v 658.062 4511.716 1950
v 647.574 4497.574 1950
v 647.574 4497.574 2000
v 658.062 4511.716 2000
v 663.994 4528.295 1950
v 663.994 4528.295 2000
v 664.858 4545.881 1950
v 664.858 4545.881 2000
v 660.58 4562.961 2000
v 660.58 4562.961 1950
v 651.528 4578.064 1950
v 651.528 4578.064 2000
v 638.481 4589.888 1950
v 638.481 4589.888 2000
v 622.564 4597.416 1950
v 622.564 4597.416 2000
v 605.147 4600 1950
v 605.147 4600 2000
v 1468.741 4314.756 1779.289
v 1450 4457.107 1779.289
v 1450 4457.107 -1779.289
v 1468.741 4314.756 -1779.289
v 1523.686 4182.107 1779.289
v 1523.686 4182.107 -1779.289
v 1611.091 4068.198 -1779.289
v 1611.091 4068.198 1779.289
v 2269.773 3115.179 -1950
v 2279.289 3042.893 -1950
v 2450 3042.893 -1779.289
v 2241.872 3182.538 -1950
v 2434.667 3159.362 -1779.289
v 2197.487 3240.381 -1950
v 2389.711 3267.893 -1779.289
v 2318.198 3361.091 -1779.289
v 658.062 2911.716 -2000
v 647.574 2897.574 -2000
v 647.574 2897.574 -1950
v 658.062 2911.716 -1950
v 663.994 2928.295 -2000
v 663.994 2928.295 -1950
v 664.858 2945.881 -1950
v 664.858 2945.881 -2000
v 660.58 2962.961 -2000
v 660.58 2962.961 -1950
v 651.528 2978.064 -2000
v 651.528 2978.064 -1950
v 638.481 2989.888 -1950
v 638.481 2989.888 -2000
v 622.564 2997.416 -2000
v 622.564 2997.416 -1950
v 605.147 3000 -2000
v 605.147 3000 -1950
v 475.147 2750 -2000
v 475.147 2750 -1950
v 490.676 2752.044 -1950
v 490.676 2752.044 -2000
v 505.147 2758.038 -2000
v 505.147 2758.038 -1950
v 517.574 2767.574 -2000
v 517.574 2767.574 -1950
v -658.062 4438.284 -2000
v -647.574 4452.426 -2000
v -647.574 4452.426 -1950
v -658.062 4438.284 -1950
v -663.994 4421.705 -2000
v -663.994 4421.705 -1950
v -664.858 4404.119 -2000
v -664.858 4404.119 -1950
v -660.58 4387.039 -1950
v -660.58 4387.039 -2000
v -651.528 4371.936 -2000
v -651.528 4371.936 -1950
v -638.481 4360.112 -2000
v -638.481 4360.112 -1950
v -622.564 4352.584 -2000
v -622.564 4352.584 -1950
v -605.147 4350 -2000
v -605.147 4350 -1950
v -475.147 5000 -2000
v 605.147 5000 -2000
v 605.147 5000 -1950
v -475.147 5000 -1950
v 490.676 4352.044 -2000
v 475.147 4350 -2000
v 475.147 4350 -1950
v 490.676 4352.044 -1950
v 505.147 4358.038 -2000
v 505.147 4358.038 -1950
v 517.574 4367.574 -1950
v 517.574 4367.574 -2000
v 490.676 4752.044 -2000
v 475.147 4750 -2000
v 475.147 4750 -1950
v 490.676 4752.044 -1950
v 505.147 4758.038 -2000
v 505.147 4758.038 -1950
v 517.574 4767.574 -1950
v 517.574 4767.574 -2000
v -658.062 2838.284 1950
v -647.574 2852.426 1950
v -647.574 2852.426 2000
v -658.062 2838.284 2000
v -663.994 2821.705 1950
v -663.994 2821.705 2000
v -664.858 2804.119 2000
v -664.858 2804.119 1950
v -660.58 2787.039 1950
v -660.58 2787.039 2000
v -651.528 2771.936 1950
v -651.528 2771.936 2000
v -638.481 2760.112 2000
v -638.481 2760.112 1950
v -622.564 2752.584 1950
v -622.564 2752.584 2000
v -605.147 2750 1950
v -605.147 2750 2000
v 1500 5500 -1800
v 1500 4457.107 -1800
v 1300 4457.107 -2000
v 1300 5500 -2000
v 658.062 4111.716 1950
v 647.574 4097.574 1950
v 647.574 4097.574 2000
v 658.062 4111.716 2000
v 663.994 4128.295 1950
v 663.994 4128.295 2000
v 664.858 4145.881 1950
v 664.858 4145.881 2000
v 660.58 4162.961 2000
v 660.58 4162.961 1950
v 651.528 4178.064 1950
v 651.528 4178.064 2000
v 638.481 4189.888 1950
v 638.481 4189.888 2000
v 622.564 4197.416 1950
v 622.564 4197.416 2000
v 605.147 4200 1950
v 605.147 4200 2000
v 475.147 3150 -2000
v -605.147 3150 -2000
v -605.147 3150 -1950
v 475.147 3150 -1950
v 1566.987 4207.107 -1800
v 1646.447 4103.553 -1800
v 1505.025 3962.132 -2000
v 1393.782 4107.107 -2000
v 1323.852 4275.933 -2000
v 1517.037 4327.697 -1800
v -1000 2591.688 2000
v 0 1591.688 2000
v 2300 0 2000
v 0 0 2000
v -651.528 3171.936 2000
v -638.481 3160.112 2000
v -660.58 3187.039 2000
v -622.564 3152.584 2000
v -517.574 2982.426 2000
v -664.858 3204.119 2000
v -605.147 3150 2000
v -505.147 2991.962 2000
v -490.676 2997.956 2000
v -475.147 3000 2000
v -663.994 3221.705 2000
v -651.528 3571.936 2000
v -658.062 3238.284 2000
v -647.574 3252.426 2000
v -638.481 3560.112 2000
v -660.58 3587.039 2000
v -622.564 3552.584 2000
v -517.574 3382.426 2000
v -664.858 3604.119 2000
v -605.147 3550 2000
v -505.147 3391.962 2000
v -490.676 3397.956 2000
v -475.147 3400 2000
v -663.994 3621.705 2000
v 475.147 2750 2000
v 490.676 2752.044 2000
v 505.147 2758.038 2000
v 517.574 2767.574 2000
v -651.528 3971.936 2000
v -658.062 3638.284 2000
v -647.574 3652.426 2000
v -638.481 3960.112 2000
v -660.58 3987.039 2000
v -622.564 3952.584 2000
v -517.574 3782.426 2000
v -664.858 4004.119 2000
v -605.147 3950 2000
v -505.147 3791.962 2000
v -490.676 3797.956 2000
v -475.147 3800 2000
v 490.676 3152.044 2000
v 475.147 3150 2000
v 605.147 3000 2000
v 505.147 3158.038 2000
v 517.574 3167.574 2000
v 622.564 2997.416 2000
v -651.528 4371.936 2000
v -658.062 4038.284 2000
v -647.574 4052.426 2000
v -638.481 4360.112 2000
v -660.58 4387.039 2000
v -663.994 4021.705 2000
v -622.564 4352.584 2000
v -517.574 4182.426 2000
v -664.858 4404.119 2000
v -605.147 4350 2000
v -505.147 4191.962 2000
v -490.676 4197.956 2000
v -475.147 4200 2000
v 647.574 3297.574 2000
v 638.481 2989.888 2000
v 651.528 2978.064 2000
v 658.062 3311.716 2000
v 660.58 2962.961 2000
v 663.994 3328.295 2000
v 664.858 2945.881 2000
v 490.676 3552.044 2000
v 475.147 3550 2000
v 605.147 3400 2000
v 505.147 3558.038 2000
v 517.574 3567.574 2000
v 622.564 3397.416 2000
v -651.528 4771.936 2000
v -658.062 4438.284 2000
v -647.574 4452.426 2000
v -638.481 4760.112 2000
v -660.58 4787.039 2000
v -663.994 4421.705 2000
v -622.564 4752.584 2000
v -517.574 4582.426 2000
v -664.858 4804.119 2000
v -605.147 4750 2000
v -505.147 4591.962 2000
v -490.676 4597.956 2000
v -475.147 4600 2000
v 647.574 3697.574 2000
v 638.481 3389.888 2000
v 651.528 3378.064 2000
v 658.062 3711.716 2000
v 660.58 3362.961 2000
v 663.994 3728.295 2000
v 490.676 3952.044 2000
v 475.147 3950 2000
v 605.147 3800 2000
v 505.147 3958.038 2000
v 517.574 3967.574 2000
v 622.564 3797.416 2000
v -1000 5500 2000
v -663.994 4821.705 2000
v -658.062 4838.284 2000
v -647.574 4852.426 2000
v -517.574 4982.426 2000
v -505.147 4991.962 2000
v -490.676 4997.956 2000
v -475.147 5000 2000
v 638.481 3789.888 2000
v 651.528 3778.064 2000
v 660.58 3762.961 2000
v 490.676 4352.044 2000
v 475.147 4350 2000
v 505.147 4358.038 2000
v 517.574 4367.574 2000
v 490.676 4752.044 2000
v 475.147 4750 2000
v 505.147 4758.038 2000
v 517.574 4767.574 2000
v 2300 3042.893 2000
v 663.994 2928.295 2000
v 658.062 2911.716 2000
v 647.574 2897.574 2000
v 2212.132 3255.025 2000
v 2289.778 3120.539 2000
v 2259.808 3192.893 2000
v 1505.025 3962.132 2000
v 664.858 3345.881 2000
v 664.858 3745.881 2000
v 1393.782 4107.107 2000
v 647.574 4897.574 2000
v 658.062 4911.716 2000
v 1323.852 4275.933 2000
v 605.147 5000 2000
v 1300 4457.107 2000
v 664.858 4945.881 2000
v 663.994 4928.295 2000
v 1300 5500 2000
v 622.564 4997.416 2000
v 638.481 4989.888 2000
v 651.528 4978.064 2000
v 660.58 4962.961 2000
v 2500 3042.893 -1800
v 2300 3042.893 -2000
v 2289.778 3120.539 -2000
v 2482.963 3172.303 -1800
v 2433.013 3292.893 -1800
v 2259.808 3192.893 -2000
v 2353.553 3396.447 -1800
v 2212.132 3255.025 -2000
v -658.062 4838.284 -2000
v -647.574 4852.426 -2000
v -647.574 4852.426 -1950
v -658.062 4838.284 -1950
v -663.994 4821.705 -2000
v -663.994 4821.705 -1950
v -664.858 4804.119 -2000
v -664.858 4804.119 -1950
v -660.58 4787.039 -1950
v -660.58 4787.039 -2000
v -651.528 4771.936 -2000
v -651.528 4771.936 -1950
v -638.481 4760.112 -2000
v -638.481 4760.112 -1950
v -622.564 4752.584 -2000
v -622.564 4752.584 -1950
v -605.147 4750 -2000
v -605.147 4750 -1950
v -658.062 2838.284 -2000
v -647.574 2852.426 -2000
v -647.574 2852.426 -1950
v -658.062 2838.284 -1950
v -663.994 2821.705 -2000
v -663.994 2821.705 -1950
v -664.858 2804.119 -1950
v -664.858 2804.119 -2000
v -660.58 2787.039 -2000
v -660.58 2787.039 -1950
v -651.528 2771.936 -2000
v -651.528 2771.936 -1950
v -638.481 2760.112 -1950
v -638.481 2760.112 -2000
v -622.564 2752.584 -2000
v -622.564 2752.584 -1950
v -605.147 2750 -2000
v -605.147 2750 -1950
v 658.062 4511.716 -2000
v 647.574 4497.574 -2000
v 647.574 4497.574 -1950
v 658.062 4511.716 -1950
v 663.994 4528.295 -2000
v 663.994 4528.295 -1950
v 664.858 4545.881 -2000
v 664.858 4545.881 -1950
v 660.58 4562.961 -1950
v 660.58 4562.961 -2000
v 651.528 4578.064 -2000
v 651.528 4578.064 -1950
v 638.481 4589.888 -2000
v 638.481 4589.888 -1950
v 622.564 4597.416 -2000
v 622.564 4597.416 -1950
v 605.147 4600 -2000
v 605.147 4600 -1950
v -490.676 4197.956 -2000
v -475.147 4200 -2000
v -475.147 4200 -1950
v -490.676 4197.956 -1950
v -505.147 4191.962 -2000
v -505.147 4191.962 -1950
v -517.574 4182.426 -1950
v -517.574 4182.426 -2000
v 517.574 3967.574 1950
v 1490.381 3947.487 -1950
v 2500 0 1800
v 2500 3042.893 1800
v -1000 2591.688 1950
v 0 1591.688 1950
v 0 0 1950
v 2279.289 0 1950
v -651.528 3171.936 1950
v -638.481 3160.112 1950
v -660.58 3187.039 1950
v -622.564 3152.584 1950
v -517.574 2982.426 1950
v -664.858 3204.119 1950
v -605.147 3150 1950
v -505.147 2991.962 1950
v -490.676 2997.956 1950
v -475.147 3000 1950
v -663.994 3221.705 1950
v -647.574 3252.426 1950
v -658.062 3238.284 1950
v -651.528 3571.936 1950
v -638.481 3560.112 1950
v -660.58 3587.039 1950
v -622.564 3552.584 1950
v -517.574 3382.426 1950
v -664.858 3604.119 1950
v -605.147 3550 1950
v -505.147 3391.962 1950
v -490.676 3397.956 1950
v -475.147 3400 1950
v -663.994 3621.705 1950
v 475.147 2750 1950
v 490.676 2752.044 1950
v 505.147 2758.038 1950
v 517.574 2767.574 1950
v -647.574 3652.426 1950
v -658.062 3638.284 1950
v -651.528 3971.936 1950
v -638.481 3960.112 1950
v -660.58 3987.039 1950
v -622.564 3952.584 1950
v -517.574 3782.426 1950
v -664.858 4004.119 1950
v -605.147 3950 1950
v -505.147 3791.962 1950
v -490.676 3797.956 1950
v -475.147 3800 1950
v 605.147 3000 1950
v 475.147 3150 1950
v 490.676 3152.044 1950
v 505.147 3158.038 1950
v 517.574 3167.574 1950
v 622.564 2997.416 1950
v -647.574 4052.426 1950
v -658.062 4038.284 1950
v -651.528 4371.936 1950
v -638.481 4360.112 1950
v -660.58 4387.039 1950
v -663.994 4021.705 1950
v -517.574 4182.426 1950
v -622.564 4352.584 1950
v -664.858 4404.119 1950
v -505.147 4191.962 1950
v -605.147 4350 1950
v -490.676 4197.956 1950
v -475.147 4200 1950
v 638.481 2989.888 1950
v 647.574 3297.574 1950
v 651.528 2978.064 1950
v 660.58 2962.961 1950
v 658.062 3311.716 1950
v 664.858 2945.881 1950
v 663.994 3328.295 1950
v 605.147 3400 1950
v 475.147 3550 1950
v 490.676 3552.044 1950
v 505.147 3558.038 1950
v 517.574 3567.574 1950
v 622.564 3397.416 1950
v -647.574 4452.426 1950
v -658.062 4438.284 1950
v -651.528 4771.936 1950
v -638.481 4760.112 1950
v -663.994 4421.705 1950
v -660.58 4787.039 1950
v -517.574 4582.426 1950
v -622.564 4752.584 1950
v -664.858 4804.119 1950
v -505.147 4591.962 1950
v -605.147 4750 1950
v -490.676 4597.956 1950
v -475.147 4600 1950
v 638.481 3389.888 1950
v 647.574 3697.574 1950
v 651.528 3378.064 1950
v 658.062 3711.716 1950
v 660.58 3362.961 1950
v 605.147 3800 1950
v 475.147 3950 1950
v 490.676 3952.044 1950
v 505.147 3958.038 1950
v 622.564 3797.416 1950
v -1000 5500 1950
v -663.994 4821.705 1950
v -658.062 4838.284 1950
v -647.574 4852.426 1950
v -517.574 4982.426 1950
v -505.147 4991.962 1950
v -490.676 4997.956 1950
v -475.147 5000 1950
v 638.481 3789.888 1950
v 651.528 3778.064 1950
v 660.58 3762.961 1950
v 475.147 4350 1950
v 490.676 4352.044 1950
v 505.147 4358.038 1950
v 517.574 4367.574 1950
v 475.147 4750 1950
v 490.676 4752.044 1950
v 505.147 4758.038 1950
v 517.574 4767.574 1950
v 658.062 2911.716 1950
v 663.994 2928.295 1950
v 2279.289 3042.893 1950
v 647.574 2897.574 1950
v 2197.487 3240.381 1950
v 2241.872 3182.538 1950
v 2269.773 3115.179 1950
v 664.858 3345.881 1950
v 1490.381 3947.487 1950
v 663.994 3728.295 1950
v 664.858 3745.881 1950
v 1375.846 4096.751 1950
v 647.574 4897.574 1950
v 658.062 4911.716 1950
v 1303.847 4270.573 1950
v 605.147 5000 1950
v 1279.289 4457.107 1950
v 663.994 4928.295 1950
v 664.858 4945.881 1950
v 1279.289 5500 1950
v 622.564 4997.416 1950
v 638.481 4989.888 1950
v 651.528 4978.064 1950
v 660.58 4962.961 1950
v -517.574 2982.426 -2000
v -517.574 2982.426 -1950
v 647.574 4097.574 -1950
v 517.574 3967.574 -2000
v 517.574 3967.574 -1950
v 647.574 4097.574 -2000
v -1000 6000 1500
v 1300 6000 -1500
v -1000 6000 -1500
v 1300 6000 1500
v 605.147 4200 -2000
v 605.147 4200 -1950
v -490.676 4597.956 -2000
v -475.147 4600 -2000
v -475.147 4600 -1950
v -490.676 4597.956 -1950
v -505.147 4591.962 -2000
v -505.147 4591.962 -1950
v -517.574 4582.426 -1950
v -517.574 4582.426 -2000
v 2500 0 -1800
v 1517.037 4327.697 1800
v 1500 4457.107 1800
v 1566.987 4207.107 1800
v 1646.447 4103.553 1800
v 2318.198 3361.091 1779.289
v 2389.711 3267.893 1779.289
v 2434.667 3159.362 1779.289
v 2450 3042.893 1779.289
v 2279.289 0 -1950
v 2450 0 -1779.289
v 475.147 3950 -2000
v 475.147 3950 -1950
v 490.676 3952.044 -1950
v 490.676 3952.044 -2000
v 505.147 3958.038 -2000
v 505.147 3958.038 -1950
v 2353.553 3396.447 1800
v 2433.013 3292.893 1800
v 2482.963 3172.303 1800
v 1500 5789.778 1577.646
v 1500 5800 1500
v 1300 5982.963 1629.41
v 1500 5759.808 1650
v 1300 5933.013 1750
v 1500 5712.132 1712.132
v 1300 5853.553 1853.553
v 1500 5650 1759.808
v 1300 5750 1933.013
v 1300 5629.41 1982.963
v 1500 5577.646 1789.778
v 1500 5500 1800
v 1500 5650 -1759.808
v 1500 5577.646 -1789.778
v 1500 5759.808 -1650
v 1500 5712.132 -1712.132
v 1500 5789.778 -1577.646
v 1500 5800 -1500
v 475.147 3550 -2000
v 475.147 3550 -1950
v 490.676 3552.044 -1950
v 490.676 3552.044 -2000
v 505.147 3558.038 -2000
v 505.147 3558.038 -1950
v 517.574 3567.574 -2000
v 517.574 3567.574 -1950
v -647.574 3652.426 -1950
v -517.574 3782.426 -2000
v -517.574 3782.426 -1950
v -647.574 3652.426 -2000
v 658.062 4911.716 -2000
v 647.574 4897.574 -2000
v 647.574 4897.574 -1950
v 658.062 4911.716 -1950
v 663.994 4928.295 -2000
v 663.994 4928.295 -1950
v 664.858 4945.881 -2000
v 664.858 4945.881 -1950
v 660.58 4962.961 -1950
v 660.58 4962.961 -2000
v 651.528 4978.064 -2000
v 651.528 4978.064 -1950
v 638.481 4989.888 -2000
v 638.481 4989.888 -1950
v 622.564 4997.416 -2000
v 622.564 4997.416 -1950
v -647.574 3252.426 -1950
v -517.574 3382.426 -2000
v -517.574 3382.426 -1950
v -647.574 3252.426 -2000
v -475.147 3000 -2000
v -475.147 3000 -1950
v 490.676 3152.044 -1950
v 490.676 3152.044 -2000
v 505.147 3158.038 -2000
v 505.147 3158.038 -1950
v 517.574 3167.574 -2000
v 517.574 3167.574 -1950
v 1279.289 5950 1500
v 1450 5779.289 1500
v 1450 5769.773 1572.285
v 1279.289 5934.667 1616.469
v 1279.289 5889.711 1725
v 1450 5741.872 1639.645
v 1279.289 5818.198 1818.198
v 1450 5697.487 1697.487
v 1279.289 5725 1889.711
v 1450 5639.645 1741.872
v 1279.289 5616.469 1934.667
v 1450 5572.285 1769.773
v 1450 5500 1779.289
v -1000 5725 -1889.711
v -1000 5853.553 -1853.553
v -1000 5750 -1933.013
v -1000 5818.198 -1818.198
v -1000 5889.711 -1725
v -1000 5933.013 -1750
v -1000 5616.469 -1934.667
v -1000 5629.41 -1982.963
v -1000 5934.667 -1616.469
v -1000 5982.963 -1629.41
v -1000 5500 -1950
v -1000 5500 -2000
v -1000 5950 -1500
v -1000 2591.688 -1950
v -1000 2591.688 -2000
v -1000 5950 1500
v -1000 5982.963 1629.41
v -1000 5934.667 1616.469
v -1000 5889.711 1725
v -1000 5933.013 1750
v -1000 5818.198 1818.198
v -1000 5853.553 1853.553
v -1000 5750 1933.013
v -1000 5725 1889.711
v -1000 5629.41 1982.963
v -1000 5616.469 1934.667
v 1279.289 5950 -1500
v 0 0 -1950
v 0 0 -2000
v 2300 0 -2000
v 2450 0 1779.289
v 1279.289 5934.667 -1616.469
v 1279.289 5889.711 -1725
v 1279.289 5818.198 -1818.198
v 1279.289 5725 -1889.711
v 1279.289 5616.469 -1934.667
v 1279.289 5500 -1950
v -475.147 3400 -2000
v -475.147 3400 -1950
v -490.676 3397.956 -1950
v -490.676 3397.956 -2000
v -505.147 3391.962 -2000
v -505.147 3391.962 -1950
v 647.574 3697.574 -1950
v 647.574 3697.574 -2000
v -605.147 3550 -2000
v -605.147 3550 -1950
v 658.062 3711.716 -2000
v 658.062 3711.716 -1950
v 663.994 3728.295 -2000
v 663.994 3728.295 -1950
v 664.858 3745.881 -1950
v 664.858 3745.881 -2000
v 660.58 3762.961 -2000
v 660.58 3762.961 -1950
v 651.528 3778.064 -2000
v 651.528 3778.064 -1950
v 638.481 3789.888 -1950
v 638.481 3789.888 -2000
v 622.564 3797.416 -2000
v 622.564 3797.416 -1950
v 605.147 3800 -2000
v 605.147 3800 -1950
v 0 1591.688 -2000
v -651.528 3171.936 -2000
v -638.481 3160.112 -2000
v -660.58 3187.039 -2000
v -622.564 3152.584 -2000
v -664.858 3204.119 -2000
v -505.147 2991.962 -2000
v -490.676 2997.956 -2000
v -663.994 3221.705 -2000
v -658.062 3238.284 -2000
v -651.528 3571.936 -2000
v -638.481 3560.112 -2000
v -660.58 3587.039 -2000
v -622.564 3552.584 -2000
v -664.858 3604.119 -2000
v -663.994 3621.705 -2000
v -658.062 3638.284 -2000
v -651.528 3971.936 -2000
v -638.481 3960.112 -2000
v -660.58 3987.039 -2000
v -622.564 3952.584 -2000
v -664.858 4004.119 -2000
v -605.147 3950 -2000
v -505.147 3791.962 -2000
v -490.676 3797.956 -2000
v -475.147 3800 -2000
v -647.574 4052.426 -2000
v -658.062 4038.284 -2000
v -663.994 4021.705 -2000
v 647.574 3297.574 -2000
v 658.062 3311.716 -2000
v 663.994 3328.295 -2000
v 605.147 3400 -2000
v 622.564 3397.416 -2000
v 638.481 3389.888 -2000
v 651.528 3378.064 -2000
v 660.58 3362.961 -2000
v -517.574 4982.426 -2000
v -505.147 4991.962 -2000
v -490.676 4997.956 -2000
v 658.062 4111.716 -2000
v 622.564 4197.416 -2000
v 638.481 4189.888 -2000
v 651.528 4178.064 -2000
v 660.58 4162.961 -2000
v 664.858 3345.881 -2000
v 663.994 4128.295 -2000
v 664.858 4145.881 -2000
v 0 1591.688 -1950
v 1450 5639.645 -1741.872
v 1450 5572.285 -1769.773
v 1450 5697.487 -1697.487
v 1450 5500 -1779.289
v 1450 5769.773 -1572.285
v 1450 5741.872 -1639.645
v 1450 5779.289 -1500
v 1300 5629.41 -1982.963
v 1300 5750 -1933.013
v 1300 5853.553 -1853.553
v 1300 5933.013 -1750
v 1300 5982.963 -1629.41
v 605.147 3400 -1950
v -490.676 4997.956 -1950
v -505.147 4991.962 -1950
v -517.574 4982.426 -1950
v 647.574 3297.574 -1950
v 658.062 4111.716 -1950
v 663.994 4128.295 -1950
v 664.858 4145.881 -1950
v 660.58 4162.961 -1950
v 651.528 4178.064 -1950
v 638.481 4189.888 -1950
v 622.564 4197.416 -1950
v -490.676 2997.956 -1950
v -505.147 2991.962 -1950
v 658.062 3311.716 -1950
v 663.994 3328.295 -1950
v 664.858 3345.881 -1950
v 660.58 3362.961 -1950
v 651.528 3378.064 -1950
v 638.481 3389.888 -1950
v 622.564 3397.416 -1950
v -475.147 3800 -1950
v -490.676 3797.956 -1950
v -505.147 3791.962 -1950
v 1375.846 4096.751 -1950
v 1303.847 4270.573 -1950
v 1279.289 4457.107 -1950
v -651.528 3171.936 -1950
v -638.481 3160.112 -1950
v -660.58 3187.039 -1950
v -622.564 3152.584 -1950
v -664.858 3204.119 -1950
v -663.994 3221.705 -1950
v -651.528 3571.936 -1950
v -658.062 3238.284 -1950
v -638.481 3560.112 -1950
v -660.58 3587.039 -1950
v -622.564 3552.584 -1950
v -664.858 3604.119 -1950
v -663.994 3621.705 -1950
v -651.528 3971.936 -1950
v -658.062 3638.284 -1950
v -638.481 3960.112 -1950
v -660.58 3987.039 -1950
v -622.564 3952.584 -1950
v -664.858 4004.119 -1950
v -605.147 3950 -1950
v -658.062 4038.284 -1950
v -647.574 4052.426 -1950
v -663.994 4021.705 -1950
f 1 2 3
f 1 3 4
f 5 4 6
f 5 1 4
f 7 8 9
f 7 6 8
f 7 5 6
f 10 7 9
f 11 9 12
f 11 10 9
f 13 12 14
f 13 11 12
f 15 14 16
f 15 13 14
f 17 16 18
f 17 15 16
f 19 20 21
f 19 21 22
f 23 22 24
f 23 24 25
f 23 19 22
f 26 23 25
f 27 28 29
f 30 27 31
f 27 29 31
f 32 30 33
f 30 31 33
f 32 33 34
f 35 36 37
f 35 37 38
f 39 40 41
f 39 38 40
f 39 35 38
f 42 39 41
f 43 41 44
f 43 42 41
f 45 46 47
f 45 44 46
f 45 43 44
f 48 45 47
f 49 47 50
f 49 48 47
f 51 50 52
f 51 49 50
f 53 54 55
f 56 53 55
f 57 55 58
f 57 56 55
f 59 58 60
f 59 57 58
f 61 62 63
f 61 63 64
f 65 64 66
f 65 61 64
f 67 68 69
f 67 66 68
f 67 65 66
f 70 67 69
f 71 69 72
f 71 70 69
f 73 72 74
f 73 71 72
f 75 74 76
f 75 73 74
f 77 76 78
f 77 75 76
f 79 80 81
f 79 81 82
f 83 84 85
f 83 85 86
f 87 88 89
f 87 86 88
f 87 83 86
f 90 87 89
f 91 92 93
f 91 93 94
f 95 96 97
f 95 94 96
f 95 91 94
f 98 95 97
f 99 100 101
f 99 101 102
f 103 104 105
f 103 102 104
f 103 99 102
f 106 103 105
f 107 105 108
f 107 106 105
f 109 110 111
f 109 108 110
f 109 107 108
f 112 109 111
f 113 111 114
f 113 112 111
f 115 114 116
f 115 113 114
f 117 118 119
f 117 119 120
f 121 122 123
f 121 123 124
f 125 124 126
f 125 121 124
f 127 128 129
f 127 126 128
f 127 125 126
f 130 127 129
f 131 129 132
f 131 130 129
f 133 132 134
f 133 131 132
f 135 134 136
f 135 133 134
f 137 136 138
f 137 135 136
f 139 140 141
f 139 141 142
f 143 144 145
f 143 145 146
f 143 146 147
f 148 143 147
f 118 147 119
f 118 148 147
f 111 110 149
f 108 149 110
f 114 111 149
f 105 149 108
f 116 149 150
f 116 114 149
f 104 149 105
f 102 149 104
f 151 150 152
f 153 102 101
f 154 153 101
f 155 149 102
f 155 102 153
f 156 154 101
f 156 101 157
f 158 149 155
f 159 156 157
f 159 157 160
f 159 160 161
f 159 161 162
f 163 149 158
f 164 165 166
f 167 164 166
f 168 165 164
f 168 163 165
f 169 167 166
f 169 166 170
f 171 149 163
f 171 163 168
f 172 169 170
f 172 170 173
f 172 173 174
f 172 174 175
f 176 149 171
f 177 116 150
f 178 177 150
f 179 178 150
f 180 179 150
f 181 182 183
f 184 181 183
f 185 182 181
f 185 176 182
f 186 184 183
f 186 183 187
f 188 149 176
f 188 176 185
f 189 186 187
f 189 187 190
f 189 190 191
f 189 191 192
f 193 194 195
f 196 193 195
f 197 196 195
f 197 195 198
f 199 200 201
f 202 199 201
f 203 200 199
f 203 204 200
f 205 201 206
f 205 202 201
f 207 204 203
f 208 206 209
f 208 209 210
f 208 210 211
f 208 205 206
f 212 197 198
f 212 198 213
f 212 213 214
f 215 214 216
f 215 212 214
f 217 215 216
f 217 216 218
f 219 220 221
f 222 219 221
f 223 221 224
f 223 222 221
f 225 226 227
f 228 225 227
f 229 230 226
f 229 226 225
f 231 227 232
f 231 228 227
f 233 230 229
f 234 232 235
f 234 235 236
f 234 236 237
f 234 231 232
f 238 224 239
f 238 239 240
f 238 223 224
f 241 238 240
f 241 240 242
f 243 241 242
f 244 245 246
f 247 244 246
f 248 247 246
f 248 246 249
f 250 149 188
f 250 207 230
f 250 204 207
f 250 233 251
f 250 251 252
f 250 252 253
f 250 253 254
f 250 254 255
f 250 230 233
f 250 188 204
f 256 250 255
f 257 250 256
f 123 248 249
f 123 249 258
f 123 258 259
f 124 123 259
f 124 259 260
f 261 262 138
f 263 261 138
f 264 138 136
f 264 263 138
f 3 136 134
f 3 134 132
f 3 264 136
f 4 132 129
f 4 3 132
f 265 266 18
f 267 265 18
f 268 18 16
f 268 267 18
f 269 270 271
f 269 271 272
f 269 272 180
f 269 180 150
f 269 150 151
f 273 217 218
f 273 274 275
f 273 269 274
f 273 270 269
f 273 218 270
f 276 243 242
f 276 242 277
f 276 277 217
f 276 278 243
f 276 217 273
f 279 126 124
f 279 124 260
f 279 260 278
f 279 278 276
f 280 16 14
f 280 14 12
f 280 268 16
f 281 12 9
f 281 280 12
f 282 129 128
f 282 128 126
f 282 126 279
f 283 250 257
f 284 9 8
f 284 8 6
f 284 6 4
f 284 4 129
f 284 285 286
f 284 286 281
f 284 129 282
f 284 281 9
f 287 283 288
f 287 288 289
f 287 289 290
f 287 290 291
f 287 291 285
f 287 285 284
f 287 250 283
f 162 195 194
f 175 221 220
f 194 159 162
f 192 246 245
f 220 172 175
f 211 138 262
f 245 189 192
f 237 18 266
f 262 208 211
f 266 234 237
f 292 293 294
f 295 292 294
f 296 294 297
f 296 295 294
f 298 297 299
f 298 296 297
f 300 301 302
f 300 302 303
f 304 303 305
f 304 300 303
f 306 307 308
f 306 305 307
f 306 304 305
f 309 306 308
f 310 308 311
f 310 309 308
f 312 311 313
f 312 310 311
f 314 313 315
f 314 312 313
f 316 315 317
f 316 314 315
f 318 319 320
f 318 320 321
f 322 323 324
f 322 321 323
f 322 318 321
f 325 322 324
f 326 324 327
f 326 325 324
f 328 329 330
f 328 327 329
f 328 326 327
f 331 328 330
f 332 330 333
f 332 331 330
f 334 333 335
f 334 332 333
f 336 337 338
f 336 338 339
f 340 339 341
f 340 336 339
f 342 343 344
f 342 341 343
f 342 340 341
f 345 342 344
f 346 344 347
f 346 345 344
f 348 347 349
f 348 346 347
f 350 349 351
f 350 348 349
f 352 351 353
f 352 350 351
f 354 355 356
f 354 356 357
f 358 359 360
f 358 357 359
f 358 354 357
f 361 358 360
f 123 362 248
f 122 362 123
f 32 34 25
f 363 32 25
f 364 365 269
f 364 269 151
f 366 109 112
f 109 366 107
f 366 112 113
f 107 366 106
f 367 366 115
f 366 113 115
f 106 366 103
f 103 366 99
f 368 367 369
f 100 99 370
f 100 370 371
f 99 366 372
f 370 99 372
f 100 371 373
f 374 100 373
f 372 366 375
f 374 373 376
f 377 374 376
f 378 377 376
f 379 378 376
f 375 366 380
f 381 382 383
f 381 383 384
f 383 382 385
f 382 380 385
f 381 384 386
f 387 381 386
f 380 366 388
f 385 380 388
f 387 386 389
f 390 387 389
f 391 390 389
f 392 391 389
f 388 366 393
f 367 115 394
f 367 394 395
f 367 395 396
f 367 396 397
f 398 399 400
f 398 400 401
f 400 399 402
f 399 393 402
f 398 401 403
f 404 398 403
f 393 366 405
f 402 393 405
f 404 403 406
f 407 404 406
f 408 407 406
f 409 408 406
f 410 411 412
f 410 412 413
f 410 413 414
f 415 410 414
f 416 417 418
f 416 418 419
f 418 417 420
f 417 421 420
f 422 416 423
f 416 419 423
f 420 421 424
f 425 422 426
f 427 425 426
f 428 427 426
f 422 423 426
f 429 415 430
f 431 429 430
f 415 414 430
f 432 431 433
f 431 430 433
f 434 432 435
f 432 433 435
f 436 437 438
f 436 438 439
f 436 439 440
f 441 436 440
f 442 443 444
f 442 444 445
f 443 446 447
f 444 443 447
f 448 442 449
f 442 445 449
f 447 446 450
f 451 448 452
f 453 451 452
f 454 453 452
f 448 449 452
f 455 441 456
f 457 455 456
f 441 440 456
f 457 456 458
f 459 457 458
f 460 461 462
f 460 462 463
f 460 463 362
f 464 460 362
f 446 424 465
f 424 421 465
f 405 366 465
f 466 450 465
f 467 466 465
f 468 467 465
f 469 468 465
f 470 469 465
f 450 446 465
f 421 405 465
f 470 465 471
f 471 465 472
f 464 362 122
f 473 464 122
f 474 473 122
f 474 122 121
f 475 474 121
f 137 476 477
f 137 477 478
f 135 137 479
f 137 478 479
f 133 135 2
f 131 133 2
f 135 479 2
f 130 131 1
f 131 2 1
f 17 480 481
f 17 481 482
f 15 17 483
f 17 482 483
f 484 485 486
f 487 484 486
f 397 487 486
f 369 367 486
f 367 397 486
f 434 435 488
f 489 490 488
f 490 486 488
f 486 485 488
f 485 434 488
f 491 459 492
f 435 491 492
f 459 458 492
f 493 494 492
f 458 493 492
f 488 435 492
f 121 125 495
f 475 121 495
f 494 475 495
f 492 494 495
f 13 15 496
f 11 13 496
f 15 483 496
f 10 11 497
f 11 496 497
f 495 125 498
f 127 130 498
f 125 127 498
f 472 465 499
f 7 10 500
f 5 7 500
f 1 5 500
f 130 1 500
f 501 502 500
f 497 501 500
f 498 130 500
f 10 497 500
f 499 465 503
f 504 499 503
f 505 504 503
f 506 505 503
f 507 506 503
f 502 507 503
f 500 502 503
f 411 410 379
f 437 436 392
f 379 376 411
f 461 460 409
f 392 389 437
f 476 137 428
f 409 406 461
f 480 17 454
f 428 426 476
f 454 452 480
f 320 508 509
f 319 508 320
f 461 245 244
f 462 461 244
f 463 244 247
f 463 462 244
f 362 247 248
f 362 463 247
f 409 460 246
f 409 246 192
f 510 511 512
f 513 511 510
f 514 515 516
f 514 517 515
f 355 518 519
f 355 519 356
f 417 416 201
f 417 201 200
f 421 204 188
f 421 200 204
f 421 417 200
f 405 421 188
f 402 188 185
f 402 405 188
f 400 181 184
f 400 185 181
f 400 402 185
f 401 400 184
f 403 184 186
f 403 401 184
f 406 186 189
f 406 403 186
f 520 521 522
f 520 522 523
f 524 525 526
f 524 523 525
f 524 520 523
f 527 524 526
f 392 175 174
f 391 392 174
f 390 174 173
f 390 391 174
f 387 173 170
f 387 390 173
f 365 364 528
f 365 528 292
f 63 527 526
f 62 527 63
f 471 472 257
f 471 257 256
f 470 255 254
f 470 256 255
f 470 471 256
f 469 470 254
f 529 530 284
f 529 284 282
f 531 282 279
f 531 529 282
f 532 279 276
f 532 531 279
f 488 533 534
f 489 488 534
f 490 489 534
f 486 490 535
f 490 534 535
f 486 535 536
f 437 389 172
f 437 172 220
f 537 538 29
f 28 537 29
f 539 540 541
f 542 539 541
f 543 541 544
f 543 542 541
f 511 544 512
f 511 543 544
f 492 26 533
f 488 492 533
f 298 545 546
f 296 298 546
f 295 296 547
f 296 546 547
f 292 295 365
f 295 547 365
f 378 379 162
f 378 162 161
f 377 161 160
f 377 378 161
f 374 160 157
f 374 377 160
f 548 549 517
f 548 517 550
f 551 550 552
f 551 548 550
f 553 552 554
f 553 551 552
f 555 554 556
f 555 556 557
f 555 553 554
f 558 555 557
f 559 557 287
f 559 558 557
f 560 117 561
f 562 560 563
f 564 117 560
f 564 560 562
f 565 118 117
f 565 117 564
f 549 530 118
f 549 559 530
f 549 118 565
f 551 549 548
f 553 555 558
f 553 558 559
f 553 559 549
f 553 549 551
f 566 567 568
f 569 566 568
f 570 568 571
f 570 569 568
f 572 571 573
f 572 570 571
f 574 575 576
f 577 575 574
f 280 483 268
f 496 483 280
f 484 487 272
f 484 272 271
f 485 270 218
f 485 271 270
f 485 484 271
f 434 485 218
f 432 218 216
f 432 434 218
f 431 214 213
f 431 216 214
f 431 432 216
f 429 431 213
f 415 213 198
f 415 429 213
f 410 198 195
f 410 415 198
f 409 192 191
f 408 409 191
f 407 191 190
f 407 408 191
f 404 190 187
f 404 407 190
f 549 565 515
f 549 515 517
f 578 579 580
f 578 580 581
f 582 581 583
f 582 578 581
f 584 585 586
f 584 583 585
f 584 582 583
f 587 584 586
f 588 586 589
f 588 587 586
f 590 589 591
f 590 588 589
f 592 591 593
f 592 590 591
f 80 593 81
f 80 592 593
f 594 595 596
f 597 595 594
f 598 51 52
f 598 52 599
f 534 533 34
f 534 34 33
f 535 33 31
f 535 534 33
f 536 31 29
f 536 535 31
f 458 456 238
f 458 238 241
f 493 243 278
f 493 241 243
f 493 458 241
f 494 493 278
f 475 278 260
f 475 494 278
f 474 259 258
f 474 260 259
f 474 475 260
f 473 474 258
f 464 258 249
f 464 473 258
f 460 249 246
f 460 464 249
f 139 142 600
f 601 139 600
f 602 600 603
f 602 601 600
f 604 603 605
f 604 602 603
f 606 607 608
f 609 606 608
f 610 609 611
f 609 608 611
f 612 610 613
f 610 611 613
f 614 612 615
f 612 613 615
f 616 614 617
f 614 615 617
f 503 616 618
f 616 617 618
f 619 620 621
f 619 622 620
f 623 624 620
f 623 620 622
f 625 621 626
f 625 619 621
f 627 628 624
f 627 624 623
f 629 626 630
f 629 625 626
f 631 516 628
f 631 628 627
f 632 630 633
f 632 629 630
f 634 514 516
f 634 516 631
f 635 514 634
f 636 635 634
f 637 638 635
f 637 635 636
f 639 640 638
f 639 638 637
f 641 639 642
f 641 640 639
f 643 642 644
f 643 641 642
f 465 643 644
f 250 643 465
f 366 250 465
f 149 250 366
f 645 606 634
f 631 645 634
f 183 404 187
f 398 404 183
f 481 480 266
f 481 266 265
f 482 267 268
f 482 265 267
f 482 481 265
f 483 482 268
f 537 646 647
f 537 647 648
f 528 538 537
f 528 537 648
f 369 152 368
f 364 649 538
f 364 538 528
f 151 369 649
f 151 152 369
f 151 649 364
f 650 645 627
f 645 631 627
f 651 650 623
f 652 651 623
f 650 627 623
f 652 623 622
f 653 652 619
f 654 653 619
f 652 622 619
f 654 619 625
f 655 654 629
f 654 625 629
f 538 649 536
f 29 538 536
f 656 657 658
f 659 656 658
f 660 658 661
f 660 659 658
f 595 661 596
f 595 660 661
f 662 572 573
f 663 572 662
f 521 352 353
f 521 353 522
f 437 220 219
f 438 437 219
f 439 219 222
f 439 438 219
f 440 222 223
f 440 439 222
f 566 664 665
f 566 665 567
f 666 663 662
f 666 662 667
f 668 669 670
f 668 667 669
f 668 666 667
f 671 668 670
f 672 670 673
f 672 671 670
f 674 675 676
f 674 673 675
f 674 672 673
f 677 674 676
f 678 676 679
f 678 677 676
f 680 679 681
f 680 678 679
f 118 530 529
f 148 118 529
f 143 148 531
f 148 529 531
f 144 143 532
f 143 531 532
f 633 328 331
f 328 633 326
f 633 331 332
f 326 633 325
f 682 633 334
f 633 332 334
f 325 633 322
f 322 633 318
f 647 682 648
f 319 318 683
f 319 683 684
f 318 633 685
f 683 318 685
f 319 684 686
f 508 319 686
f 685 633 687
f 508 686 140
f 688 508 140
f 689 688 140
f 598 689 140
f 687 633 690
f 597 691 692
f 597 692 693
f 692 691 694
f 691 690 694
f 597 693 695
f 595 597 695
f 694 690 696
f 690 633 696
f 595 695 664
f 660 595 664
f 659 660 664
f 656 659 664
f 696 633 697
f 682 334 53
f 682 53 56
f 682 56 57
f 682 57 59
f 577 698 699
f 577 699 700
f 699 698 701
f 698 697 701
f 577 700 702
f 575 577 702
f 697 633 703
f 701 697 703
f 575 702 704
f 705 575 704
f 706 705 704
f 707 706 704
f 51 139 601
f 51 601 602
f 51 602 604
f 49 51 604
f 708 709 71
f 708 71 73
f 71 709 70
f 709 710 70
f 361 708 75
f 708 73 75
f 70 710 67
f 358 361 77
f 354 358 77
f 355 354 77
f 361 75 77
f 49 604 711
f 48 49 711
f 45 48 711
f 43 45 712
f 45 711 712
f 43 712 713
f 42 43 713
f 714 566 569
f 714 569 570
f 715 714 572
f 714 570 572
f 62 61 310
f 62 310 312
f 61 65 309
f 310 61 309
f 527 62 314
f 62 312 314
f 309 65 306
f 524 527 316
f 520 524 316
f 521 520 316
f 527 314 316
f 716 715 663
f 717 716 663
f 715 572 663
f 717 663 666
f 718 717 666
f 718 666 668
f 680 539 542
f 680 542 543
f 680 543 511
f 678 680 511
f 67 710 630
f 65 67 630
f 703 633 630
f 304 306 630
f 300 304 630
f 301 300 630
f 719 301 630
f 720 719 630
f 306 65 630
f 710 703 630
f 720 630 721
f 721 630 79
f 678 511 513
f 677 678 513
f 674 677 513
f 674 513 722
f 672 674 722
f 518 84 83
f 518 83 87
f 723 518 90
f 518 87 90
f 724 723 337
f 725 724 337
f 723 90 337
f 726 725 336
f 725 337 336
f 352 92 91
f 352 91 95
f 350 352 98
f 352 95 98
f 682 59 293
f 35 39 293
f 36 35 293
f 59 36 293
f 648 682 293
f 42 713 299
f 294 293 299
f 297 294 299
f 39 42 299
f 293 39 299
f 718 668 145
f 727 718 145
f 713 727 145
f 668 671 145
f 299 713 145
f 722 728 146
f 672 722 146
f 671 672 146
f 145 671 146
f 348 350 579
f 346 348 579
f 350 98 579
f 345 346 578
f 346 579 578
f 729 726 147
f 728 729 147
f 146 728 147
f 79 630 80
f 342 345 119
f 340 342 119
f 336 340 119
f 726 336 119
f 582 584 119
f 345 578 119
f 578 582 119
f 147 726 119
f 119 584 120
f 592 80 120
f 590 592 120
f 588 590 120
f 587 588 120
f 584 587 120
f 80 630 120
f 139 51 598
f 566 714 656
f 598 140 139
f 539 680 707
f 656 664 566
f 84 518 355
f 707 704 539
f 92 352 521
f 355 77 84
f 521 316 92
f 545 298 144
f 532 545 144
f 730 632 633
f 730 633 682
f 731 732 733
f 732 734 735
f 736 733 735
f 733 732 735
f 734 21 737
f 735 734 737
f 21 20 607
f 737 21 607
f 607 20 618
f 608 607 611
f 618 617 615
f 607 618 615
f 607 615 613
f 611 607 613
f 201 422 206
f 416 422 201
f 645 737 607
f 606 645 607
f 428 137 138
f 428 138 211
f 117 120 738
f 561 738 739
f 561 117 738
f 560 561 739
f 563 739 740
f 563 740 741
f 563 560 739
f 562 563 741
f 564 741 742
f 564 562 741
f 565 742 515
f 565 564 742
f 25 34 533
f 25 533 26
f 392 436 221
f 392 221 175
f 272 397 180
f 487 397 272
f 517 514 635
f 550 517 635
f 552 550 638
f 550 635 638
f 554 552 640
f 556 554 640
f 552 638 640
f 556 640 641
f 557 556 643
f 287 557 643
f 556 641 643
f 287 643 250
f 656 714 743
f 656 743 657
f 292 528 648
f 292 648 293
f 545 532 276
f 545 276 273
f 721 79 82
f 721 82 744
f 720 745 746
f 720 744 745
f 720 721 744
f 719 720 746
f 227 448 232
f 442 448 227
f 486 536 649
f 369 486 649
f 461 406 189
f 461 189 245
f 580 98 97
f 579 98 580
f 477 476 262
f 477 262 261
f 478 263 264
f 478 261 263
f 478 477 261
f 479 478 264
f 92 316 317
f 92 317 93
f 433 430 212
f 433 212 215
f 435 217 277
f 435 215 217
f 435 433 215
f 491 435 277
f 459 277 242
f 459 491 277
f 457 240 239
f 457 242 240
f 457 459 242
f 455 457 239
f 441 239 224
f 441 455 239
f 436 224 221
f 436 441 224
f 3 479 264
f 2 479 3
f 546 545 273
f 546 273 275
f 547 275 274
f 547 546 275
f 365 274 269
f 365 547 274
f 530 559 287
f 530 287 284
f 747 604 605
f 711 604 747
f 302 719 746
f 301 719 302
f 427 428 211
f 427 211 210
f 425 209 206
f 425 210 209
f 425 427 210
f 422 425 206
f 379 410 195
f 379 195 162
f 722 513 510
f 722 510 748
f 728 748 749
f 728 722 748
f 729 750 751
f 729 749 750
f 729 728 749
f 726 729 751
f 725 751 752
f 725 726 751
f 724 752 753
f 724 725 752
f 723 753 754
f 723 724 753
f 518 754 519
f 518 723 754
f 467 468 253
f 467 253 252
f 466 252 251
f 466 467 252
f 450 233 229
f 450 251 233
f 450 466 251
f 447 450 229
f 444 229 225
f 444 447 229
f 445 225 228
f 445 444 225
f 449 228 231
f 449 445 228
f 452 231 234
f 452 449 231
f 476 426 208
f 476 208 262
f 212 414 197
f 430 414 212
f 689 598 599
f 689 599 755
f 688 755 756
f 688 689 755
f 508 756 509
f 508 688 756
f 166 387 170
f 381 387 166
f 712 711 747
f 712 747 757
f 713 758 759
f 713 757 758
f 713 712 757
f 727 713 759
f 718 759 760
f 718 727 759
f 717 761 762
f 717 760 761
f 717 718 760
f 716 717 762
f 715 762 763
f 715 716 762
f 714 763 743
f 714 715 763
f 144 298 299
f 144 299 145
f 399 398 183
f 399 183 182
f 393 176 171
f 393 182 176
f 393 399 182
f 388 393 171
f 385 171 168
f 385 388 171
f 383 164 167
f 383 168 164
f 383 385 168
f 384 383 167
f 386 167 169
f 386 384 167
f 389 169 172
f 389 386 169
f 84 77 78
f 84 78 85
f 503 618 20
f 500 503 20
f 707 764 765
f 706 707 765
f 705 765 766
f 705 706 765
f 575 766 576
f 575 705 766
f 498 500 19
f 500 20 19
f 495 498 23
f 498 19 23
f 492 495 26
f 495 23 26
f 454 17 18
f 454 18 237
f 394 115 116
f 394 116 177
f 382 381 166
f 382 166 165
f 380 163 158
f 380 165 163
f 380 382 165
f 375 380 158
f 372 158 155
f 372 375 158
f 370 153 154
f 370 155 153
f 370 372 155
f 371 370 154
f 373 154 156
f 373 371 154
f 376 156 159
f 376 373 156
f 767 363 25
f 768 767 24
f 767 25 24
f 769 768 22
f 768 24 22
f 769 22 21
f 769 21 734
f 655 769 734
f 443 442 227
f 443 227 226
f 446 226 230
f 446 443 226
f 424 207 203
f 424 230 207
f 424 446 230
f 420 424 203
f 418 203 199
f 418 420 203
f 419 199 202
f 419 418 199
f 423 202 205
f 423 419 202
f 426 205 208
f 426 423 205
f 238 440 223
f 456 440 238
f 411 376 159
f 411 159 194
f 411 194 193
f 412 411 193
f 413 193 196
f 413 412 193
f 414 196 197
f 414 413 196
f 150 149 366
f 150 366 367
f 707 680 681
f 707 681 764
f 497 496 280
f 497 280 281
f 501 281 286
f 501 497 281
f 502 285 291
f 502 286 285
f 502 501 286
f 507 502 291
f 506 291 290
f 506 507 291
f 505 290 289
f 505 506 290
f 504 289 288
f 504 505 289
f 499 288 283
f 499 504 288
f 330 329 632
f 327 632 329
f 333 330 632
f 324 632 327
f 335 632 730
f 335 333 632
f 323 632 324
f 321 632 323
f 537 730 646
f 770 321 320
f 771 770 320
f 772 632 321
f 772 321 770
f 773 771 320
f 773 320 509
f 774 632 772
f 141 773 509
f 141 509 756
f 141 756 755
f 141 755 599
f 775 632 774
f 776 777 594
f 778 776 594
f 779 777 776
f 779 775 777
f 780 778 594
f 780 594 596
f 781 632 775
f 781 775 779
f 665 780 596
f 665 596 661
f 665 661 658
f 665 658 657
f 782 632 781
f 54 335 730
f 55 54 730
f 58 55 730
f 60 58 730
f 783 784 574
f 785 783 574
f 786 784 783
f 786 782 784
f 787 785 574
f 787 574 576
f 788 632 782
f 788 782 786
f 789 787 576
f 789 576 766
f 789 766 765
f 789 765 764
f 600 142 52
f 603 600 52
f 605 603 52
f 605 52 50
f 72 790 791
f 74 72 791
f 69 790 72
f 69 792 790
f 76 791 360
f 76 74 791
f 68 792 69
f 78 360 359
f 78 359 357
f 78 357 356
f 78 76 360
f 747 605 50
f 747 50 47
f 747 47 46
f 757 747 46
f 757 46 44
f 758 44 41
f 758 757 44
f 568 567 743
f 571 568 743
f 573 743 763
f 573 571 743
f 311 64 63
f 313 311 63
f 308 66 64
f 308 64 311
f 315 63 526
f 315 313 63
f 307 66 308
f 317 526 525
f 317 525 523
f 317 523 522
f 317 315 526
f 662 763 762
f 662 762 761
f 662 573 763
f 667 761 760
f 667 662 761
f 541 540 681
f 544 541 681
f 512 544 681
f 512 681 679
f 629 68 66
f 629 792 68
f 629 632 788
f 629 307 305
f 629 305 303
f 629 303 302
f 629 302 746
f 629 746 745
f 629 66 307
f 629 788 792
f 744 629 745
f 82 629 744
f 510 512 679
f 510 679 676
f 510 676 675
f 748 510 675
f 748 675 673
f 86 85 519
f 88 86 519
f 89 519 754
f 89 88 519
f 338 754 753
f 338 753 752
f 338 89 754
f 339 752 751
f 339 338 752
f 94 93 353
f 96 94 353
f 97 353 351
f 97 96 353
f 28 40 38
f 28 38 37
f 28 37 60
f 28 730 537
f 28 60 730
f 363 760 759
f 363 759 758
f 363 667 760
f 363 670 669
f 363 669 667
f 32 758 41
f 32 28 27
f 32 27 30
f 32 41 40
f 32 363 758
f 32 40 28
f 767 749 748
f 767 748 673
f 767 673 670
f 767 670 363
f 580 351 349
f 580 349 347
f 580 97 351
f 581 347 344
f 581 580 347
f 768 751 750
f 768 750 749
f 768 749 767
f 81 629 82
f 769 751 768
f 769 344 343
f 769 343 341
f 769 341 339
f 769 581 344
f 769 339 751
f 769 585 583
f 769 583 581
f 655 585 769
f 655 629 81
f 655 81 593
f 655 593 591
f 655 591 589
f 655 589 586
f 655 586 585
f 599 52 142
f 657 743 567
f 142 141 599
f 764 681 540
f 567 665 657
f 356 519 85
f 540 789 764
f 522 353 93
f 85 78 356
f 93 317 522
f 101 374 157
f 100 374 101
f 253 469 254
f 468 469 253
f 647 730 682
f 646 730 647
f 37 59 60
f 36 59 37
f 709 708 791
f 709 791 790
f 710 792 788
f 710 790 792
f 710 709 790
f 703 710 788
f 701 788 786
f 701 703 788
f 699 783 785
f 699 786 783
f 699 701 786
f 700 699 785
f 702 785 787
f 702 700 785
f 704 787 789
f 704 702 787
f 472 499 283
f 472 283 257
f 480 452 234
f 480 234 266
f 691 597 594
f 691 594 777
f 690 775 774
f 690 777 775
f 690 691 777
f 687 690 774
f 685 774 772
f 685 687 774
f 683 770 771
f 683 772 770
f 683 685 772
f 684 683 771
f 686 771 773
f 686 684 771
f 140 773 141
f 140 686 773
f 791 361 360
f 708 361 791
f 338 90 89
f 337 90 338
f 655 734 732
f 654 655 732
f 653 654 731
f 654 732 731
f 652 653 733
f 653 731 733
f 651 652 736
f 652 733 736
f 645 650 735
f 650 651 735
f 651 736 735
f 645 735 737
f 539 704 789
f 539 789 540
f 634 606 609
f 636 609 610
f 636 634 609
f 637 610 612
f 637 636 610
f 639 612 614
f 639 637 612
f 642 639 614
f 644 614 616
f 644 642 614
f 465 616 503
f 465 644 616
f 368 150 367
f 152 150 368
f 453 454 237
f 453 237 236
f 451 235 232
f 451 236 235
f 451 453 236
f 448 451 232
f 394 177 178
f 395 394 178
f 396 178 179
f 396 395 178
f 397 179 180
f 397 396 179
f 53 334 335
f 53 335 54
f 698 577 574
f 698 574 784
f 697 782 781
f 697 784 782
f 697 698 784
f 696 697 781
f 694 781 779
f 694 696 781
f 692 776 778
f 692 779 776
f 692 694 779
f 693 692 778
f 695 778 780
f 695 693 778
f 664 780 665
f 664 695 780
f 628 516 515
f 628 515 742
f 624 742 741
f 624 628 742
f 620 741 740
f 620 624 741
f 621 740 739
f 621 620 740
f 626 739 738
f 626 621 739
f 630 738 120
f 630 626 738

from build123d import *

# Parameters (mm, degrees)
BOSS_EXTRUDE1_DEPTH     = 2000
FILLET1_R               = 500
CHAMFER1_SIZE           = 200
SHELL1_T                = -50
CUT_EXTRUDE1_DEPTH      = 6801.735254368
CUT_EXTRUDE1_DEPTH_BACK = 6801.735254368


with BuildPart() as part:
    # Sketch1 → Boss-Extrude1 (new, symmetric)
    with BuildSketch(Plane.XY):
        Polygon((0, 0), (2500, 0), (2500, 3250), (1500, 4250), (1500, 6000), (-1000, 6000), (-1000, 2591.687604822), (0, 1591.687604822), align=None)
    extrude(amount=BOSS_EXTRUDE1_DEPTH, both=True)

    # Fillet1
    fillet1_edges = [part.edges().sort_by_distance(p)[0] for p in [
        (1500, 4250, 0),
        (2500, 3250, 0),
        (250, 6000, 2000),
        (250, 6000, -2000),
    ]]
    fillet(fillet1_edges, radius=FILLET1_R)

    # Chamfer1
    chamfer1_edges = [part.edges().sort_by_distance(p)[0] for p in [
        (2500, 1521.446609407, -2000),
        (2500, 1521.446609407, 2000),
        (2000, 3750, -2000),
        (2000, 3750, 2000),
        (1500, 4978.553390593, -2000),
        (2461.939766256, 3234.234934996, -2000),
        (1500, 4978.553390593, 2000),
        (2461.939766256, 3234.234934996, 2000),
        (1500, 6000, 0),
        (1500, 5853.553390593, 1853.553390593),
        (1500, 5853.553390593, -1853.553390593),
        (1538.060233744, 4265.765065004, -2000),
        (1538.060233744, 4265.765065004, 2000),
    ]]
    chamfer(chamfer1_edges, length=CHAMFER1_SIZE)

    # Shell1
    shell1_openings = [part.faces().sort_by_distance(p)[0] for p in [
        (-500, 2091.687604822, 0),
        (-1000, 4283.210771138, 0),
        (1245.247657296, 0, 0),
        (0, 795.843802411, 0),
    ]]
    offset(amount=SHELL1_T, openings=shell1_openings, kind=Kind.INTERSECTION)

    # Sketch2 → Cut-Extrude1 (cut, two sides: drawn at the far end of the back side and taken through both)
    with BuildSketch(Plane.XY.offset(-CUT_EXTRUDE1_DEPTH_BACK)):
        with BuildLine():
            Line((-517.573593129, 4982.426406871), (-647.573593129, 4852.426406871))
            ThreePointArc((-647.573593129, 4852.426406871), (-660.579958208, 4787.038994058), (-605.147186258, 4750))
            Line((-605.147186258, 4750), (475.147186258, 4750))
            ThreePointArc((475.147186258, 4750), (498.1081922, 4754.567228049), (517.573593129, 4767.573593129))
            Line((517.573593129, 4767.573593129), (647.573593129, 4897.573593129))
            ThreePointArc((647.573593129, 4897.573593129), (660.579958208, 4962.961005942), (605.147186258, 5000))
            Line((605.147186258, 5000), (-475.147186258, 5000))
            ThreePointArc((-475.147186258, 5000), (-498.1081922, 4995.432771951), (-517.573593129, 4982.426406871))
        make_face()
        with BuildLine():
            Line((-517.573593129, 4582.426406871), (-647.573593129, 4452.426406871))
            ThreePointArc((-647.573593129, 4452.426406871), (-660.579958208, 4387.038994058), (-605.147186258, 4350))
            Line((-605.147186258, 4350), (475.147186258, 4350))
            ThreePointArc((475.147186258, 4350), (498.1081922, 4354.567228049), (517.573593129, 4367.573593129))
            Line((517.573593129, 4367.573593129), (647.573593129, 4497.573593129))
            ThreePointArc((647.573593129, 4497.573593129), (660.579958208, 4562.961005942), (605.147186258, 4600))
            Line((605.147186258, 4600), (-475.147186258, 4600))
            ThreePointArc((-475.147186258, 4600), (-498.1081922, 4595.432771951), (-517.573593129, 4582.426406871))
        make_face()
        with BuildLine():
            Line((-517.573593129, 4182.426406871), (-647.573593129, 4052.426406871))
            ThreePointArc((-647.573593129, 4052.426406871), (-660.579958208, 3987.038994058), (-605.147186258, 3950))
            Line((-605.147186258, 3950), (475.147186258, 3950))
            ThreePointArc((475.147186258, 3950), (498.1081922, 3954.567228049), (517.573593129, 3967.573593129))
            Line((517.573593129, 3967.573593129), (647.573593129, 4097.573593129))
            ThreePointArc((647.573593129, 4097.573593129), (660.579958208, 4162.961005942), (605.147186258, 4200))
            Line((605.147186258, 4200), (-475.147186258, 4200))
            ThreePointArc((-475.147186258, 4200), (-498.1081922, 4195.432771951), (-517.573593129, 4182.426406871))
        make_face()
        with BuildLine():
            Line((-517.573593129, 3782.426406871), (-647.573593129, 3652.426406871))
            ThreePointArc((-647.573593129, 3652.426406871), (-660.579958208, 3587.038994058), (-605.147186258, 3550))
            Line((-605.147186258, 3550), (475.147186258, 3550))
            ThreePointArc((475.147186258, 3550), (498.1081922, 3554.567228049), (517.573593129, 3567.573593129))
            Line((517.573593129, 3567.573593129), (647.573593129, 3697.573593129))
            ThreePointArc((647.573593129, 3697.573593129), (660.579958208, 3762.961005942), (605.147186258, 3800))
            Line((605.147186258, 3800), (-475.147186258, 3800))
            ThreePointArc((-475.147186258, 3800), (-498.1081922, 3795.432771951), (-517.573593129, 3782.426406871))
        make_face()
        with BuildLine():
            Line((-517.573593129, 3382.426406871), (-647.573593129, 3252.426406871))
            ThreePointArc((-647.573593129, 3252.426406871), (-660.579958208, 3187.038994058), (-605.147186258, 3150))
            Line((-605.147186258, 3150), (475.147186258, 3150))
            ThreePointArc((475.147186258, 3150), (498.1081922, 3154.567228049), (517.573593129, 3167.573593129))
            Line((517.573593129, 3167.573593129), (647.573593129, 3297.573593129))
            ThreePointArc((647.573593129, 3297.573593129), (660.579958208, 3362.961005942), (605.147186258, 3400))
            Line((605.147186258, 3400), (-475.147186258, 3400))
            ThreePointArc((-475.147186258, 3400), (-498.1081922, 3395.432771951), (-517.573593129, 3382.426406871))
        make_face()
        with BuildLine():
            Line((-517.573593129, 2982.426406871), (-647.573593129, 2852.426406871))
            ThreePointArc((-647.573593129, 2852.426406871), (-660.579958208, 2787.038994058), (-605.147186258, 2750))
            Line((-605.147186258, 2750), (475.147186258, 2750))
            ThreePointArc((475.147186258, 2750), (498.1081922, 2754.567228049), (517.573593129, 2767.573593129))
            Line((517.573593129, 2767.573593129), (647.573593129, 2897.573593129))
            ThreePointArc((647.573593129, 2897.573593129), (660.579958208, 2962.961005942), (605.147186258, 3000))
            Line((605.147186258, 3000), (-475.147186258, 3000))
            ThreePointArc((-475.147186258, 3000), (-498.108192199, 2995.432771951), (-517.573593129, 2982.426406871))
        make_face()
    extrude(amount=CUT_EXTRUDE1_DEPTH + CUT_EXTRUDE1_DEPTH_BACK, mode=Mode.SUBTRACT)


solid = part.part
